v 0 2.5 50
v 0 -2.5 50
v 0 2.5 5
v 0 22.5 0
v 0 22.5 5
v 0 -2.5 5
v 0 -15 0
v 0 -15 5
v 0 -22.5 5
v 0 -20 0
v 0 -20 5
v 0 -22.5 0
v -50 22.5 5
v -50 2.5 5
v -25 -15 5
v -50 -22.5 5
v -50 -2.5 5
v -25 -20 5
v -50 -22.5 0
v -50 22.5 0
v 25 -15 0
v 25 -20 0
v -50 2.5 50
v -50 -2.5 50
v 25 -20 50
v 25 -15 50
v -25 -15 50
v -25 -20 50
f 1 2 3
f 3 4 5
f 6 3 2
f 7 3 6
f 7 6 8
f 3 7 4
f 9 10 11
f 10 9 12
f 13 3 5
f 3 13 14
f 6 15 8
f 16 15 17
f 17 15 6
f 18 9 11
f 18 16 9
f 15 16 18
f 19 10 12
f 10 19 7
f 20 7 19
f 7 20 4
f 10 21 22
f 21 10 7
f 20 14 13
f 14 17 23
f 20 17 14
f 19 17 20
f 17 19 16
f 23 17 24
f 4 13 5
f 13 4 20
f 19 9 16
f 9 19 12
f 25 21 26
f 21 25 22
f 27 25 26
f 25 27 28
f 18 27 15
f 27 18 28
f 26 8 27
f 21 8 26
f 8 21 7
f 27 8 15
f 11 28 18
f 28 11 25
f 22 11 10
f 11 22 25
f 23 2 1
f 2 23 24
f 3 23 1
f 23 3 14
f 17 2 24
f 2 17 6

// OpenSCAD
// Built by bench/smallmodels/features/compiler.py from a list of features.
$fn = 64;
difference() {
  union() {
    translate([-25, 0, 0]) translate([-25, -22.5, 0]) cube([50, 45, 5]);
    translate([0, -17.5, 0]) translate([-25, -2.5, 0]) cube([50, 5, 50]);
  }
  union() {
    translate([-17, 30, 2.5]) rotate([0, 0, 0]) rotate([0, 90, 0]) cylinder(d = 4.5, h = 1200, center = true);
    translate([17, 30, 2.5]) rotate([0, 0, 0]) rotate([0, 90, 0]) cylinder(d = 4.5, h = 1200, center = true);
  }
}
difference() {
  union() {
    translate([-25, 0, 0]) translate([-25, -2.5, 0]) cube([50, 5, 50]);
  }
  union() {
    translate([0, -17.5, -1]) rotate([0, 0, 0]) cylinder(d = 23, h = 52);
  }
}
